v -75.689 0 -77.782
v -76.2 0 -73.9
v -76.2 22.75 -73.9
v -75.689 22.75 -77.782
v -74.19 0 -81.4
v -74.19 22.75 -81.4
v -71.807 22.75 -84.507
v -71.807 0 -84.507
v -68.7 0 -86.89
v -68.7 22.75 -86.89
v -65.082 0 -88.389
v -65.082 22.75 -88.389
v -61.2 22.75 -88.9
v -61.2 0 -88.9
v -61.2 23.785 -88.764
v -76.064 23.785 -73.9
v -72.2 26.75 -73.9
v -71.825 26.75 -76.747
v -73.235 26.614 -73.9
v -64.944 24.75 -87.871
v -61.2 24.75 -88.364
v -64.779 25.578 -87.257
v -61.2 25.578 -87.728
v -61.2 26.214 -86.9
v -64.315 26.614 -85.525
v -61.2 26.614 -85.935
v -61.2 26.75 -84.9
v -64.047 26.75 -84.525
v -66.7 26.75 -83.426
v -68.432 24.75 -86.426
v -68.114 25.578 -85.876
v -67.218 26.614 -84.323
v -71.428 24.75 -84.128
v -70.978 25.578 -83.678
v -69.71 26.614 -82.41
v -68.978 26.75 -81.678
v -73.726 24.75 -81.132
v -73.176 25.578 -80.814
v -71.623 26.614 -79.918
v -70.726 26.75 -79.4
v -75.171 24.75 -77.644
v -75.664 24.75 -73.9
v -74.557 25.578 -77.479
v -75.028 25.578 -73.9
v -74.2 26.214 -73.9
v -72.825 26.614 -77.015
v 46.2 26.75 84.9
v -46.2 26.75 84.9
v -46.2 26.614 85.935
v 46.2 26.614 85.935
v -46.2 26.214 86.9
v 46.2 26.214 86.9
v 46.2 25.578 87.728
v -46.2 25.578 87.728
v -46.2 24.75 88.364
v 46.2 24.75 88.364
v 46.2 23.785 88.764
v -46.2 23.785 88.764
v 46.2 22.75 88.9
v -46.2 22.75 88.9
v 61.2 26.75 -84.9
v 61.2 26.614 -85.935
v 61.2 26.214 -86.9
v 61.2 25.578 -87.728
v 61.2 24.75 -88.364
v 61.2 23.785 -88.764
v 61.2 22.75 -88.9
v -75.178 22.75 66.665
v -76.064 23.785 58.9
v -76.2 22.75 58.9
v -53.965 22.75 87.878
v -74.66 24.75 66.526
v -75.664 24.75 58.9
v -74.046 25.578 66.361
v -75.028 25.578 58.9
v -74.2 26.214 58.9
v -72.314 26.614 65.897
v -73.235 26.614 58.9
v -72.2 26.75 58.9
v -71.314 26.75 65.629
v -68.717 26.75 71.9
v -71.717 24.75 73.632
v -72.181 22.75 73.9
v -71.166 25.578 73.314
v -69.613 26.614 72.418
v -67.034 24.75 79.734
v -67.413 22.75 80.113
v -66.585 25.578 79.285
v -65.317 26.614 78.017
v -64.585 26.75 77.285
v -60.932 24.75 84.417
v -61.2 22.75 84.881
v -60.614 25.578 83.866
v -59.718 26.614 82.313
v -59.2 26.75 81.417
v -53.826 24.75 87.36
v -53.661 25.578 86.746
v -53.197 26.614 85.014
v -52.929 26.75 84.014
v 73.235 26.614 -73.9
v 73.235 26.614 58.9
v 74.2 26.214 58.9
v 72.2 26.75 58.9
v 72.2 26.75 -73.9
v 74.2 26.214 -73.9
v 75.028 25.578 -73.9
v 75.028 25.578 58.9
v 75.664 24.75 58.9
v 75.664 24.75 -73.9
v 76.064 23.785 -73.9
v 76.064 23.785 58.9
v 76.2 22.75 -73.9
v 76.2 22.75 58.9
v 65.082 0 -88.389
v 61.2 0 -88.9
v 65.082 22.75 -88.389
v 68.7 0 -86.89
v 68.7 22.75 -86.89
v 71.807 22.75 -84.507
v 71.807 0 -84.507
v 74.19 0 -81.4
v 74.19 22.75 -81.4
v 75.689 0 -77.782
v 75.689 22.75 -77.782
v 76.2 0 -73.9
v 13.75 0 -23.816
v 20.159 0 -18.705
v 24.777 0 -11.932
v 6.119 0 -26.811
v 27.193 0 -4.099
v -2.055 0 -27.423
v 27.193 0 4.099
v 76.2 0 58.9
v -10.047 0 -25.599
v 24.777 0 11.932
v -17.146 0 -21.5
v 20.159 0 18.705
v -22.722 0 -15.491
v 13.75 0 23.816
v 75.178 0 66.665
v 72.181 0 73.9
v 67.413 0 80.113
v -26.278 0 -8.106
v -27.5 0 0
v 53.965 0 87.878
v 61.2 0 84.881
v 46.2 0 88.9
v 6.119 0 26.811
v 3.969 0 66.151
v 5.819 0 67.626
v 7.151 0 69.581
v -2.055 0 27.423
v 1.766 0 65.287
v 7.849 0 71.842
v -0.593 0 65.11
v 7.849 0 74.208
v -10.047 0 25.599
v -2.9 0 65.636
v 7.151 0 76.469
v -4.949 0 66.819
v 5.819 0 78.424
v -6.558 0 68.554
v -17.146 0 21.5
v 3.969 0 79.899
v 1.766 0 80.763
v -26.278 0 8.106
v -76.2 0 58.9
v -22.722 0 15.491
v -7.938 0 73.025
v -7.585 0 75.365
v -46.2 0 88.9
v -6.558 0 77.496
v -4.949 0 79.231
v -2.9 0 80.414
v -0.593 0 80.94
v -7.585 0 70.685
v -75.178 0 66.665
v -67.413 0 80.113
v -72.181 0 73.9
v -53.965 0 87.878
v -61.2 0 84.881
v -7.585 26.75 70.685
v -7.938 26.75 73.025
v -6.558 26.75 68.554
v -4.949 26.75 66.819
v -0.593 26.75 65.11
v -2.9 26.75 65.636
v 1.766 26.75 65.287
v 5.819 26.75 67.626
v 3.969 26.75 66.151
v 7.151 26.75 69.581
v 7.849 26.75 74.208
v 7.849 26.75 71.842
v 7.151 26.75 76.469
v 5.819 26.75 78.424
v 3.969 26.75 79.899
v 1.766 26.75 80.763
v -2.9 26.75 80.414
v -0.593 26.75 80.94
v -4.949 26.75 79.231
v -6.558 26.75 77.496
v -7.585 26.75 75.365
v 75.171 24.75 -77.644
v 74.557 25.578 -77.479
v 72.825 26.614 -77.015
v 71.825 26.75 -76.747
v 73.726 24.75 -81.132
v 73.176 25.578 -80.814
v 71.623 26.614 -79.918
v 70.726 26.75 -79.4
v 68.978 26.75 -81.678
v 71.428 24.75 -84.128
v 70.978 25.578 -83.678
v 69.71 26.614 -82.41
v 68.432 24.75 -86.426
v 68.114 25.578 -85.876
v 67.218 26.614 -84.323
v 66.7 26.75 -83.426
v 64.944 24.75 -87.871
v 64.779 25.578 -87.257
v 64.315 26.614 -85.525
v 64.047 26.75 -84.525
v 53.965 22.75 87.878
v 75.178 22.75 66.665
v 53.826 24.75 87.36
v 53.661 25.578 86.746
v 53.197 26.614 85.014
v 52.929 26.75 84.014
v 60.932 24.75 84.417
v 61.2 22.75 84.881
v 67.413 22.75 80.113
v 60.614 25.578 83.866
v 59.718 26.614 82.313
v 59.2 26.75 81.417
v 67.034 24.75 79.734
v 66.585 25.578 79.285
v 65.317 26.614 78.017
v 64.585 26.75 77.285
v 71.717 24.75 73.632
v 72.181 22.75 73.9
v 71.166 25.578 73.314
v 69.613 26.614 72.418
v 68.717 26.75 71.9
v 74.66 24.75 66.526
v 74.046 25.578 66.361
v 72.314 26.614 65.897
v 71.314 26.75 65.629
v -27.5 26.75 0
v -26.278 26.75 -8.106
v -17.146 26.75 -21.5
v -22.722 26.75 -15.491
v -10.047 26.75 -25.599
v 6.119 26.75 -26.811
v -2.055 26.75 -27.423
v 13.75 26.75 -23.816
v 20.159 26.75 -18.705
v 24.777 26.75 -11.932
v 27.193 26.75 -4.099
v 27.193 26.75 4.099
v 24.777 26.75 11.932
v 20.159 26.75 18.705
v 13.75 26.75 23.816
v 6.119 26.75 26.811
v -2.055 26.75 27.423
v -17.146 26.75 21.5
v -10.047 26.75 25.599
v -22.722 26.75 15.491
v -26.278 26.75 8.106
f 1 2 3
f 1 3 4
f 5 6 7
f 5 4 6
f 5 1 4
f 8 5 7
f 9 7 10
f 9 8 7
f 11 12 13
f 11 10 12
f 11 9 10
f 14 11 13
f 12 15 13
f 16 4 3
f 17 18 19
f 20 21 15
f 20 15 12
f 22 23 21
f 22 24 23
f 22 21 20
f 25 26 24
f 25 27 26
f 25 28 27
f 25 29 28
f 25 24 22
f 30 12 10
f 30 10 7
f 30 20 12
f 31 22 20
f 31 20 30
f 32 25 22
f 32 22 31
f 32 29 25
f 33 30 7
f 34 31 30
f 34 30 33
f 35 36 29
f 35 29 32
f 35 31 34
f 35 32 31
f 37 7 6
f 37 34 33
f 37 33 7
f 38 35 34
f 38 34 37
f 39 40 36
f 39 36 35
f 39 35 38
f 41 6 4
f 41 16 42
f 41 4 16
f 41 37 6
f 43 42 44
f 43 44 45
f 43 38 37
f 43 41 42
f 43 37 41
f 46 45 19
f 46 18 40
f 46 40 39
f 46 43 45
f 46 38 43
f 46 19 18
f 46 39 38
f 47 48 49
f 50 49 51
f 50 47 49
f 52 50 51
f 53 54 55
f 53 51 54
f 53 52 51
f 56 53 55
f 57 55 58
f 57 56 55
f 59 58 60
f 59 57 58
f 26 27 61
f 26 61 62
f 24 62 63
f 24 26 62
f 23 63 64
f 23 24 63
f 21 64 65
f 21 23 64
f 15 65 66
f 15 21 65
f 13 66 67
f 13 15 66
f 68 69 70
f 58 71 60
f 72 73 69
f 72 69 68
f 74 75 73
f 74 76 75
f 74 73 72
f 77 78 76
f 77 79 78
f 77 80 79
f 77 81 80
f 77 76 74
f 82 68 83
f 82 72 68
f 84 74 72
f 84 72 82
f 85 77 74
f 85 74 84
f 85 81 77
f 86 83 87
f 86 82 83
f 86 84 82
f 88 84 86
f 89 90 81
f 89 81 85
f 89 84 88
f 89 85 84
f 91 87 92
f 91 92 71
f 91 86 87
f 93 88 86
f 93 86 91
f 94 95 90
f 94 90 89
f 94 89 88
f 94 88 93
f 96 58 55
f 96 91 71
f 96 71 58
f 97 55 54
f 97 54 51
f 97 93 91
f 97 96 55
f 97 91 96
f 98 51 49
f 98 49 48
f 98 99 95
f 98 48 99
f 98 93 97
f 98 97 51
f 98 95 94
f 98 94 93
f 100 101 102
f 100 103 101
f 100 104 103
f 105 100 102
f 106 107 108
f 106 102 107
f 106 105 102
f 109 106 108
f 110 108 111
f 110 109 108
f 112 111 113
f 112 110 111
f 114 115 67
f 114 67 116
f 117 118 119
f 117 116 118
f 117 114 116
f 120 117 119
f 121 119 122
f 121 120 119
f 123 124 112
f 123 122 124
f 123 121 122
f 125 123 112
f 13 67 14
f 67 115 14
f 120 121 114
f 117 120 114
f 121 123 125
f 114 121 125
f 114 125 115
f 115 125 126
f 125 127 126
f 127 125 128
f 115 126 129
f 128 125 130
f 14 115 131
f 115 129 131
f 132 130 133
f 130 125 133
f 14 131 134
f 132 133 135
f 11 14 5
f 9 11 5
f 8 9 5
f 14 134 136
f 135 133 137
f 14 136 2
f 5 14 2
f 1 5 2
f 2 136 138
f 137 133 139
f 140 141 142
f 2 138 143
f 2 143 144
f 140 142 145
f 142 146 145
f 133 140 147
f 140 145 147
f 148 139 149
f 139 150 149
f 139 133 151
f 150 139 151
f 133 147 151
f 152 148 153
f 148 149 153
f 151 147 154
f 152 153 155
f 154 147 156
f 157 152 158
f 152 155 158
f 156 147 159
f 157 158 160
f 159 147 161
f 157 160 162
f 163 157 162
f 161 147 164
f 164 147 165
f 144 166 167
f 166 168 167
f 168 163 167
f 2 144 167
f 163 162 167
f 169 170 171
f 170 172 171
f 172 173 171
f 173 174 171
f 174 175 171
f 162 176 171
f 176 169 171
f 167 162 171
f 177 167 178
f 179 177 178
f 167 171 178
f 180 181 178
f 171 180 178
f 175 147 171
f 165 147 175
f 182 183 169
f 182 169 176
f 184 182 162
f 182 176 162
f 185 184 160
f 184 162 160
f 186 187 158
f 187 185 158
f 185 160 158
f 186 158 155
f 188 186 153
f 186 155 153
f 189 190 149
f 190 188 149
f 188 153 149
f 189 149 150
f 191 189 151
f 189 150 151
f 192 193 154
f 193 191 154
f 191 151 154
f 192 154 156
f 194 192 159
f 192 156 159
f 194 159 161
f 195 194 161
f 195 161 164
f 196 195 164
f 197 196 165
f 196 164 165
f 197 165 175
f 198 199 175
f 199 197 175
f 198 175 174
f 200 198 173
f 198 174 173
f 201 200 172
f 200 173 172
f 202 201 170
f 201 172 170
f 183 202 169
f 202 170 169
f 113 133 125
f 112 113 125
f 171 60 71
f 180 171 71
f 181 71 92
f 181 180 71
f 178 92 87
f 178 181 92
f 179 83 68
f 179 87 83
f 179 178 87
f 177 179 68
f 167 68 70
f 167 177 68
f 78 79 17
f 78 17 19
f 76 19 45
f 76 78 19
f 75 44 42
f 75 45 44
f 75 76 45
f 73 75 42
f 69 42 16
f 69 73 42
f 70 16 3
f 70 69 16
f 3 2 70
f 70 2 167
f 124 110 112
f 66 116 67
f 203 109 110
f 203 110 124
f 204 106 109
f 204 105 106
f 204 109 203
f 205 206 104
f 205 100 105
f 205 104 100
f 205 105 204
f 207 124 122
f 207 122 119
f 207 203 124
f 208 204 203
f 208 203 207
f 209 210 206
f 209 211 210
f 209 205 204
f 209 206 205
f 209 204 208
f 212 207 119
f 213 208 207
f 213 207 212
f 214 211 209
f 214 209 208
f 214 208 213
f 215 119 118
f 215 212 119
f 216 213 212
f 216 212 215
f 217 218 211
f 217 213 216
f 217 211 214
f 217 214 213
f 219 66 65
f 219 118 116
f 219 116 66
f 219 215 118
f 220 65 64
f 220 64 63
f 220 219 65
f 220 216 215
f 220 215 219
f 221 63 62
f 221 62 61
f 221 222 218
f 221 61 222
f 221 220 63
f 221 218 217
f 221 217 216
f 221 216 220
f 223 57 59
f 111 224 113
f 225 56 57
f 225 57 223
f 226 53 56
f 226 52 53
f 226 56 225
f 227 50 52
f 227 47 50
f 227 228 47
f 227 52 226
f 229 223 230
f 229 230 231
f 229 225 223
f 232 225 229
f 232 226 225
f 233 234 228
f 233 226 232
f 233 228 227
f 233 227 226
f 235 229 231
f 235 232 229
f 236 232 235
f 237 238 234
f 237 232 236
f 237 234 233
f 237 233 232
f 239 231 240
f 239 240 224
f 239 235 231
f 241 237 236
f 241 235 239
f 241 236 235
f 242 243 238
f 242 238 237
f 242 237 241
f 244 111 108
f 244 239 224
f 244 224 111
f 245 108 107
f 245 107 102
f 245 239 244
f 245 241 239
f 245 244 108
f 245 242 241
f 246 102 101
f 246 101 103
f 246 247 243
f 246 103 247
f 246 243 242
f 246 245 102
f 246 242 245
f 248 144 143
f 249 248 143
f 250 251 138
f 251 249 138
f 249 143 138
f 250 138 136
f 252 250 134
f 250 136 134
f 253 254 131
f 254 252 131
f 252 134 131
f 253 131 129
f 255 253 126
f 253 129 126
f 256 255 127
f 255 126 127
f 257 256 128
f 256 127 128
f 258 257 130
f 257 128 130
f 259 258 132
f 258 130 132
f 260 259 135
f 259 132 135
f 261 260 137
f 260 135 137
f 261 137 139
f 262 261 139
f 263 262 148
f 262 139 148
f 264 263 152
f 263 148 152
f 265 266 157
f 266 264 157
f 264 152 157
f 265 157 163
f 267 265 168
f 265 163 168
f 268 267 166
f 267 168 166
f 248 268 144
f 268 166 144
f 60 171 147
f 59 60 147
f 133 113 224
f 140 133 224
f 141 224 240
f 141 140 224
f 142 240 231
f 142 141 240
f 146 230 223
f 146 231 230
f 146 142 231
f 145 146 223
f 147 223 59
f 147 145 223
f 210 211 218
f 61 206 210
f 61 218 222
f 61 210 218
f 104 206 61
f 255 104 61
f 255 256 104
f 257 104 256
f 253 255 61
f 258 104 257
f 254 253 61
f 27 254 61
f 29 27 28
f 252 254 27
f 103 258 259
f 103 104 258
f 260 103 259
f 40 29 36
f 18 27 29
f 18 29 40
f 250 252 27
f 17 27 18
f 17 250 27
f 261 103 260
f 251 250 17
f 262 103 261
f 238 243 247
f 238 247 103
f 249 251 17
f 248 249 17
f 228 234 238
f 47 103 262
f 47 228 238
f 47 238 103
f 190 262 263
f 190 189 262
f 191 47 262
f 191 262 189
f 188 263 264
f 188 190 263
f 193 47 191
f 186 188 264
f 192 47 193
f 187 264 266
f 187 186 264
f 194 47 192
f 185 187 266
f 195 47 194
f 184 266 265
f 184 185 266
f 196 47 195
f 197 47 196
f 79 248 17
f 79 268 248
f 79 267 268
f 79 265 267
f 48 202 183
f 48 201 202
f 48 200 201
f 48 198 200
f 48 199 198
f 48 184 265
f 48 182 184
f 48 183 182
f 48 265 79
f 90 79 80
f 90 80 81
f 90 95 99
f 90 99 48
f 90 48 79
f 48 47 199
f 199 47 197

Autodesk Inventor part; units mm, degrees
ref_plane "YZ Plane" through (0, 0, 0) normal (1, 0, 0) x (0, 1, 0)
ref_plane "XZ Plane" through (0, 0, 0) normal (0, 1, 0) x (-1, 0, 0)
ref_plane "XY Plane" through (0, 0, 0) normal (0, 0, 1) x (1, 0, 0)
sketch "Sketch1" plane through (0, 0, 0) normal (0, 1, 0) x (-1, 0, 0)
  line L0 (-61.2, -88.9) -> (61.2, -88.9)
  line L1 (76.2, -73.9) -> (76.2, 58.9)
  line L2 (46.2, 88.9) -> (-46.2, 88.9)
  line L3 (-76.2, 58.9) -> (-76.2, -73.9)
  line L4 (-76.2, -88.9) -> (76.2, 88.9) construction
  line L5 (76.2, -88.9) -> (-76.2, 88.9) construction
  arc A0 (76.2, 58.9) -> (46.2, 88.9) centre (46.2, 58.9) ccw
  arc A1 (-46.2, 88.9) -> (-76.2, 58.9) centre (-46.2, 58.9) ccw
  arc A2 (61.2, -88.9) -> (76.2, -73.9) centre (61.2, -73.9) ccw
  arc A3 (-76.2, -73.9) -> (-61.2, -88.9) centre (-61.2, -73.9) ccw
  circle A4 centre (0, 73.025) radius 7.9375
  circle A5 centre (0, 0) radius 27.5
  dimension "d0" = 177.8
  dimension "d1" = 152.4
  dimension "d2" = 30
  dimension "d3" = 15
  dimension "d4" = 15.875
  dimension "d5" = 15.875
  dimension "d9" = 55
extrude "Extrusion1" add sketch "Sketch1" along normal blind 26.75
fillet "Fillet1" radius 4 8 edges at (71.8066, 26.75, -84.5066) (0, 26.75, -88.9) (-71.8066, 26.75, -84.5066) (-76.2, 26.75, -7.5) (-67.4132, 26.75, 80.1132) (0, 26.75, 88.9) (67.4132, 26.75, 80.1132) (76.2, 26.75, -7.5)
properties part number "Durometer_Base"
